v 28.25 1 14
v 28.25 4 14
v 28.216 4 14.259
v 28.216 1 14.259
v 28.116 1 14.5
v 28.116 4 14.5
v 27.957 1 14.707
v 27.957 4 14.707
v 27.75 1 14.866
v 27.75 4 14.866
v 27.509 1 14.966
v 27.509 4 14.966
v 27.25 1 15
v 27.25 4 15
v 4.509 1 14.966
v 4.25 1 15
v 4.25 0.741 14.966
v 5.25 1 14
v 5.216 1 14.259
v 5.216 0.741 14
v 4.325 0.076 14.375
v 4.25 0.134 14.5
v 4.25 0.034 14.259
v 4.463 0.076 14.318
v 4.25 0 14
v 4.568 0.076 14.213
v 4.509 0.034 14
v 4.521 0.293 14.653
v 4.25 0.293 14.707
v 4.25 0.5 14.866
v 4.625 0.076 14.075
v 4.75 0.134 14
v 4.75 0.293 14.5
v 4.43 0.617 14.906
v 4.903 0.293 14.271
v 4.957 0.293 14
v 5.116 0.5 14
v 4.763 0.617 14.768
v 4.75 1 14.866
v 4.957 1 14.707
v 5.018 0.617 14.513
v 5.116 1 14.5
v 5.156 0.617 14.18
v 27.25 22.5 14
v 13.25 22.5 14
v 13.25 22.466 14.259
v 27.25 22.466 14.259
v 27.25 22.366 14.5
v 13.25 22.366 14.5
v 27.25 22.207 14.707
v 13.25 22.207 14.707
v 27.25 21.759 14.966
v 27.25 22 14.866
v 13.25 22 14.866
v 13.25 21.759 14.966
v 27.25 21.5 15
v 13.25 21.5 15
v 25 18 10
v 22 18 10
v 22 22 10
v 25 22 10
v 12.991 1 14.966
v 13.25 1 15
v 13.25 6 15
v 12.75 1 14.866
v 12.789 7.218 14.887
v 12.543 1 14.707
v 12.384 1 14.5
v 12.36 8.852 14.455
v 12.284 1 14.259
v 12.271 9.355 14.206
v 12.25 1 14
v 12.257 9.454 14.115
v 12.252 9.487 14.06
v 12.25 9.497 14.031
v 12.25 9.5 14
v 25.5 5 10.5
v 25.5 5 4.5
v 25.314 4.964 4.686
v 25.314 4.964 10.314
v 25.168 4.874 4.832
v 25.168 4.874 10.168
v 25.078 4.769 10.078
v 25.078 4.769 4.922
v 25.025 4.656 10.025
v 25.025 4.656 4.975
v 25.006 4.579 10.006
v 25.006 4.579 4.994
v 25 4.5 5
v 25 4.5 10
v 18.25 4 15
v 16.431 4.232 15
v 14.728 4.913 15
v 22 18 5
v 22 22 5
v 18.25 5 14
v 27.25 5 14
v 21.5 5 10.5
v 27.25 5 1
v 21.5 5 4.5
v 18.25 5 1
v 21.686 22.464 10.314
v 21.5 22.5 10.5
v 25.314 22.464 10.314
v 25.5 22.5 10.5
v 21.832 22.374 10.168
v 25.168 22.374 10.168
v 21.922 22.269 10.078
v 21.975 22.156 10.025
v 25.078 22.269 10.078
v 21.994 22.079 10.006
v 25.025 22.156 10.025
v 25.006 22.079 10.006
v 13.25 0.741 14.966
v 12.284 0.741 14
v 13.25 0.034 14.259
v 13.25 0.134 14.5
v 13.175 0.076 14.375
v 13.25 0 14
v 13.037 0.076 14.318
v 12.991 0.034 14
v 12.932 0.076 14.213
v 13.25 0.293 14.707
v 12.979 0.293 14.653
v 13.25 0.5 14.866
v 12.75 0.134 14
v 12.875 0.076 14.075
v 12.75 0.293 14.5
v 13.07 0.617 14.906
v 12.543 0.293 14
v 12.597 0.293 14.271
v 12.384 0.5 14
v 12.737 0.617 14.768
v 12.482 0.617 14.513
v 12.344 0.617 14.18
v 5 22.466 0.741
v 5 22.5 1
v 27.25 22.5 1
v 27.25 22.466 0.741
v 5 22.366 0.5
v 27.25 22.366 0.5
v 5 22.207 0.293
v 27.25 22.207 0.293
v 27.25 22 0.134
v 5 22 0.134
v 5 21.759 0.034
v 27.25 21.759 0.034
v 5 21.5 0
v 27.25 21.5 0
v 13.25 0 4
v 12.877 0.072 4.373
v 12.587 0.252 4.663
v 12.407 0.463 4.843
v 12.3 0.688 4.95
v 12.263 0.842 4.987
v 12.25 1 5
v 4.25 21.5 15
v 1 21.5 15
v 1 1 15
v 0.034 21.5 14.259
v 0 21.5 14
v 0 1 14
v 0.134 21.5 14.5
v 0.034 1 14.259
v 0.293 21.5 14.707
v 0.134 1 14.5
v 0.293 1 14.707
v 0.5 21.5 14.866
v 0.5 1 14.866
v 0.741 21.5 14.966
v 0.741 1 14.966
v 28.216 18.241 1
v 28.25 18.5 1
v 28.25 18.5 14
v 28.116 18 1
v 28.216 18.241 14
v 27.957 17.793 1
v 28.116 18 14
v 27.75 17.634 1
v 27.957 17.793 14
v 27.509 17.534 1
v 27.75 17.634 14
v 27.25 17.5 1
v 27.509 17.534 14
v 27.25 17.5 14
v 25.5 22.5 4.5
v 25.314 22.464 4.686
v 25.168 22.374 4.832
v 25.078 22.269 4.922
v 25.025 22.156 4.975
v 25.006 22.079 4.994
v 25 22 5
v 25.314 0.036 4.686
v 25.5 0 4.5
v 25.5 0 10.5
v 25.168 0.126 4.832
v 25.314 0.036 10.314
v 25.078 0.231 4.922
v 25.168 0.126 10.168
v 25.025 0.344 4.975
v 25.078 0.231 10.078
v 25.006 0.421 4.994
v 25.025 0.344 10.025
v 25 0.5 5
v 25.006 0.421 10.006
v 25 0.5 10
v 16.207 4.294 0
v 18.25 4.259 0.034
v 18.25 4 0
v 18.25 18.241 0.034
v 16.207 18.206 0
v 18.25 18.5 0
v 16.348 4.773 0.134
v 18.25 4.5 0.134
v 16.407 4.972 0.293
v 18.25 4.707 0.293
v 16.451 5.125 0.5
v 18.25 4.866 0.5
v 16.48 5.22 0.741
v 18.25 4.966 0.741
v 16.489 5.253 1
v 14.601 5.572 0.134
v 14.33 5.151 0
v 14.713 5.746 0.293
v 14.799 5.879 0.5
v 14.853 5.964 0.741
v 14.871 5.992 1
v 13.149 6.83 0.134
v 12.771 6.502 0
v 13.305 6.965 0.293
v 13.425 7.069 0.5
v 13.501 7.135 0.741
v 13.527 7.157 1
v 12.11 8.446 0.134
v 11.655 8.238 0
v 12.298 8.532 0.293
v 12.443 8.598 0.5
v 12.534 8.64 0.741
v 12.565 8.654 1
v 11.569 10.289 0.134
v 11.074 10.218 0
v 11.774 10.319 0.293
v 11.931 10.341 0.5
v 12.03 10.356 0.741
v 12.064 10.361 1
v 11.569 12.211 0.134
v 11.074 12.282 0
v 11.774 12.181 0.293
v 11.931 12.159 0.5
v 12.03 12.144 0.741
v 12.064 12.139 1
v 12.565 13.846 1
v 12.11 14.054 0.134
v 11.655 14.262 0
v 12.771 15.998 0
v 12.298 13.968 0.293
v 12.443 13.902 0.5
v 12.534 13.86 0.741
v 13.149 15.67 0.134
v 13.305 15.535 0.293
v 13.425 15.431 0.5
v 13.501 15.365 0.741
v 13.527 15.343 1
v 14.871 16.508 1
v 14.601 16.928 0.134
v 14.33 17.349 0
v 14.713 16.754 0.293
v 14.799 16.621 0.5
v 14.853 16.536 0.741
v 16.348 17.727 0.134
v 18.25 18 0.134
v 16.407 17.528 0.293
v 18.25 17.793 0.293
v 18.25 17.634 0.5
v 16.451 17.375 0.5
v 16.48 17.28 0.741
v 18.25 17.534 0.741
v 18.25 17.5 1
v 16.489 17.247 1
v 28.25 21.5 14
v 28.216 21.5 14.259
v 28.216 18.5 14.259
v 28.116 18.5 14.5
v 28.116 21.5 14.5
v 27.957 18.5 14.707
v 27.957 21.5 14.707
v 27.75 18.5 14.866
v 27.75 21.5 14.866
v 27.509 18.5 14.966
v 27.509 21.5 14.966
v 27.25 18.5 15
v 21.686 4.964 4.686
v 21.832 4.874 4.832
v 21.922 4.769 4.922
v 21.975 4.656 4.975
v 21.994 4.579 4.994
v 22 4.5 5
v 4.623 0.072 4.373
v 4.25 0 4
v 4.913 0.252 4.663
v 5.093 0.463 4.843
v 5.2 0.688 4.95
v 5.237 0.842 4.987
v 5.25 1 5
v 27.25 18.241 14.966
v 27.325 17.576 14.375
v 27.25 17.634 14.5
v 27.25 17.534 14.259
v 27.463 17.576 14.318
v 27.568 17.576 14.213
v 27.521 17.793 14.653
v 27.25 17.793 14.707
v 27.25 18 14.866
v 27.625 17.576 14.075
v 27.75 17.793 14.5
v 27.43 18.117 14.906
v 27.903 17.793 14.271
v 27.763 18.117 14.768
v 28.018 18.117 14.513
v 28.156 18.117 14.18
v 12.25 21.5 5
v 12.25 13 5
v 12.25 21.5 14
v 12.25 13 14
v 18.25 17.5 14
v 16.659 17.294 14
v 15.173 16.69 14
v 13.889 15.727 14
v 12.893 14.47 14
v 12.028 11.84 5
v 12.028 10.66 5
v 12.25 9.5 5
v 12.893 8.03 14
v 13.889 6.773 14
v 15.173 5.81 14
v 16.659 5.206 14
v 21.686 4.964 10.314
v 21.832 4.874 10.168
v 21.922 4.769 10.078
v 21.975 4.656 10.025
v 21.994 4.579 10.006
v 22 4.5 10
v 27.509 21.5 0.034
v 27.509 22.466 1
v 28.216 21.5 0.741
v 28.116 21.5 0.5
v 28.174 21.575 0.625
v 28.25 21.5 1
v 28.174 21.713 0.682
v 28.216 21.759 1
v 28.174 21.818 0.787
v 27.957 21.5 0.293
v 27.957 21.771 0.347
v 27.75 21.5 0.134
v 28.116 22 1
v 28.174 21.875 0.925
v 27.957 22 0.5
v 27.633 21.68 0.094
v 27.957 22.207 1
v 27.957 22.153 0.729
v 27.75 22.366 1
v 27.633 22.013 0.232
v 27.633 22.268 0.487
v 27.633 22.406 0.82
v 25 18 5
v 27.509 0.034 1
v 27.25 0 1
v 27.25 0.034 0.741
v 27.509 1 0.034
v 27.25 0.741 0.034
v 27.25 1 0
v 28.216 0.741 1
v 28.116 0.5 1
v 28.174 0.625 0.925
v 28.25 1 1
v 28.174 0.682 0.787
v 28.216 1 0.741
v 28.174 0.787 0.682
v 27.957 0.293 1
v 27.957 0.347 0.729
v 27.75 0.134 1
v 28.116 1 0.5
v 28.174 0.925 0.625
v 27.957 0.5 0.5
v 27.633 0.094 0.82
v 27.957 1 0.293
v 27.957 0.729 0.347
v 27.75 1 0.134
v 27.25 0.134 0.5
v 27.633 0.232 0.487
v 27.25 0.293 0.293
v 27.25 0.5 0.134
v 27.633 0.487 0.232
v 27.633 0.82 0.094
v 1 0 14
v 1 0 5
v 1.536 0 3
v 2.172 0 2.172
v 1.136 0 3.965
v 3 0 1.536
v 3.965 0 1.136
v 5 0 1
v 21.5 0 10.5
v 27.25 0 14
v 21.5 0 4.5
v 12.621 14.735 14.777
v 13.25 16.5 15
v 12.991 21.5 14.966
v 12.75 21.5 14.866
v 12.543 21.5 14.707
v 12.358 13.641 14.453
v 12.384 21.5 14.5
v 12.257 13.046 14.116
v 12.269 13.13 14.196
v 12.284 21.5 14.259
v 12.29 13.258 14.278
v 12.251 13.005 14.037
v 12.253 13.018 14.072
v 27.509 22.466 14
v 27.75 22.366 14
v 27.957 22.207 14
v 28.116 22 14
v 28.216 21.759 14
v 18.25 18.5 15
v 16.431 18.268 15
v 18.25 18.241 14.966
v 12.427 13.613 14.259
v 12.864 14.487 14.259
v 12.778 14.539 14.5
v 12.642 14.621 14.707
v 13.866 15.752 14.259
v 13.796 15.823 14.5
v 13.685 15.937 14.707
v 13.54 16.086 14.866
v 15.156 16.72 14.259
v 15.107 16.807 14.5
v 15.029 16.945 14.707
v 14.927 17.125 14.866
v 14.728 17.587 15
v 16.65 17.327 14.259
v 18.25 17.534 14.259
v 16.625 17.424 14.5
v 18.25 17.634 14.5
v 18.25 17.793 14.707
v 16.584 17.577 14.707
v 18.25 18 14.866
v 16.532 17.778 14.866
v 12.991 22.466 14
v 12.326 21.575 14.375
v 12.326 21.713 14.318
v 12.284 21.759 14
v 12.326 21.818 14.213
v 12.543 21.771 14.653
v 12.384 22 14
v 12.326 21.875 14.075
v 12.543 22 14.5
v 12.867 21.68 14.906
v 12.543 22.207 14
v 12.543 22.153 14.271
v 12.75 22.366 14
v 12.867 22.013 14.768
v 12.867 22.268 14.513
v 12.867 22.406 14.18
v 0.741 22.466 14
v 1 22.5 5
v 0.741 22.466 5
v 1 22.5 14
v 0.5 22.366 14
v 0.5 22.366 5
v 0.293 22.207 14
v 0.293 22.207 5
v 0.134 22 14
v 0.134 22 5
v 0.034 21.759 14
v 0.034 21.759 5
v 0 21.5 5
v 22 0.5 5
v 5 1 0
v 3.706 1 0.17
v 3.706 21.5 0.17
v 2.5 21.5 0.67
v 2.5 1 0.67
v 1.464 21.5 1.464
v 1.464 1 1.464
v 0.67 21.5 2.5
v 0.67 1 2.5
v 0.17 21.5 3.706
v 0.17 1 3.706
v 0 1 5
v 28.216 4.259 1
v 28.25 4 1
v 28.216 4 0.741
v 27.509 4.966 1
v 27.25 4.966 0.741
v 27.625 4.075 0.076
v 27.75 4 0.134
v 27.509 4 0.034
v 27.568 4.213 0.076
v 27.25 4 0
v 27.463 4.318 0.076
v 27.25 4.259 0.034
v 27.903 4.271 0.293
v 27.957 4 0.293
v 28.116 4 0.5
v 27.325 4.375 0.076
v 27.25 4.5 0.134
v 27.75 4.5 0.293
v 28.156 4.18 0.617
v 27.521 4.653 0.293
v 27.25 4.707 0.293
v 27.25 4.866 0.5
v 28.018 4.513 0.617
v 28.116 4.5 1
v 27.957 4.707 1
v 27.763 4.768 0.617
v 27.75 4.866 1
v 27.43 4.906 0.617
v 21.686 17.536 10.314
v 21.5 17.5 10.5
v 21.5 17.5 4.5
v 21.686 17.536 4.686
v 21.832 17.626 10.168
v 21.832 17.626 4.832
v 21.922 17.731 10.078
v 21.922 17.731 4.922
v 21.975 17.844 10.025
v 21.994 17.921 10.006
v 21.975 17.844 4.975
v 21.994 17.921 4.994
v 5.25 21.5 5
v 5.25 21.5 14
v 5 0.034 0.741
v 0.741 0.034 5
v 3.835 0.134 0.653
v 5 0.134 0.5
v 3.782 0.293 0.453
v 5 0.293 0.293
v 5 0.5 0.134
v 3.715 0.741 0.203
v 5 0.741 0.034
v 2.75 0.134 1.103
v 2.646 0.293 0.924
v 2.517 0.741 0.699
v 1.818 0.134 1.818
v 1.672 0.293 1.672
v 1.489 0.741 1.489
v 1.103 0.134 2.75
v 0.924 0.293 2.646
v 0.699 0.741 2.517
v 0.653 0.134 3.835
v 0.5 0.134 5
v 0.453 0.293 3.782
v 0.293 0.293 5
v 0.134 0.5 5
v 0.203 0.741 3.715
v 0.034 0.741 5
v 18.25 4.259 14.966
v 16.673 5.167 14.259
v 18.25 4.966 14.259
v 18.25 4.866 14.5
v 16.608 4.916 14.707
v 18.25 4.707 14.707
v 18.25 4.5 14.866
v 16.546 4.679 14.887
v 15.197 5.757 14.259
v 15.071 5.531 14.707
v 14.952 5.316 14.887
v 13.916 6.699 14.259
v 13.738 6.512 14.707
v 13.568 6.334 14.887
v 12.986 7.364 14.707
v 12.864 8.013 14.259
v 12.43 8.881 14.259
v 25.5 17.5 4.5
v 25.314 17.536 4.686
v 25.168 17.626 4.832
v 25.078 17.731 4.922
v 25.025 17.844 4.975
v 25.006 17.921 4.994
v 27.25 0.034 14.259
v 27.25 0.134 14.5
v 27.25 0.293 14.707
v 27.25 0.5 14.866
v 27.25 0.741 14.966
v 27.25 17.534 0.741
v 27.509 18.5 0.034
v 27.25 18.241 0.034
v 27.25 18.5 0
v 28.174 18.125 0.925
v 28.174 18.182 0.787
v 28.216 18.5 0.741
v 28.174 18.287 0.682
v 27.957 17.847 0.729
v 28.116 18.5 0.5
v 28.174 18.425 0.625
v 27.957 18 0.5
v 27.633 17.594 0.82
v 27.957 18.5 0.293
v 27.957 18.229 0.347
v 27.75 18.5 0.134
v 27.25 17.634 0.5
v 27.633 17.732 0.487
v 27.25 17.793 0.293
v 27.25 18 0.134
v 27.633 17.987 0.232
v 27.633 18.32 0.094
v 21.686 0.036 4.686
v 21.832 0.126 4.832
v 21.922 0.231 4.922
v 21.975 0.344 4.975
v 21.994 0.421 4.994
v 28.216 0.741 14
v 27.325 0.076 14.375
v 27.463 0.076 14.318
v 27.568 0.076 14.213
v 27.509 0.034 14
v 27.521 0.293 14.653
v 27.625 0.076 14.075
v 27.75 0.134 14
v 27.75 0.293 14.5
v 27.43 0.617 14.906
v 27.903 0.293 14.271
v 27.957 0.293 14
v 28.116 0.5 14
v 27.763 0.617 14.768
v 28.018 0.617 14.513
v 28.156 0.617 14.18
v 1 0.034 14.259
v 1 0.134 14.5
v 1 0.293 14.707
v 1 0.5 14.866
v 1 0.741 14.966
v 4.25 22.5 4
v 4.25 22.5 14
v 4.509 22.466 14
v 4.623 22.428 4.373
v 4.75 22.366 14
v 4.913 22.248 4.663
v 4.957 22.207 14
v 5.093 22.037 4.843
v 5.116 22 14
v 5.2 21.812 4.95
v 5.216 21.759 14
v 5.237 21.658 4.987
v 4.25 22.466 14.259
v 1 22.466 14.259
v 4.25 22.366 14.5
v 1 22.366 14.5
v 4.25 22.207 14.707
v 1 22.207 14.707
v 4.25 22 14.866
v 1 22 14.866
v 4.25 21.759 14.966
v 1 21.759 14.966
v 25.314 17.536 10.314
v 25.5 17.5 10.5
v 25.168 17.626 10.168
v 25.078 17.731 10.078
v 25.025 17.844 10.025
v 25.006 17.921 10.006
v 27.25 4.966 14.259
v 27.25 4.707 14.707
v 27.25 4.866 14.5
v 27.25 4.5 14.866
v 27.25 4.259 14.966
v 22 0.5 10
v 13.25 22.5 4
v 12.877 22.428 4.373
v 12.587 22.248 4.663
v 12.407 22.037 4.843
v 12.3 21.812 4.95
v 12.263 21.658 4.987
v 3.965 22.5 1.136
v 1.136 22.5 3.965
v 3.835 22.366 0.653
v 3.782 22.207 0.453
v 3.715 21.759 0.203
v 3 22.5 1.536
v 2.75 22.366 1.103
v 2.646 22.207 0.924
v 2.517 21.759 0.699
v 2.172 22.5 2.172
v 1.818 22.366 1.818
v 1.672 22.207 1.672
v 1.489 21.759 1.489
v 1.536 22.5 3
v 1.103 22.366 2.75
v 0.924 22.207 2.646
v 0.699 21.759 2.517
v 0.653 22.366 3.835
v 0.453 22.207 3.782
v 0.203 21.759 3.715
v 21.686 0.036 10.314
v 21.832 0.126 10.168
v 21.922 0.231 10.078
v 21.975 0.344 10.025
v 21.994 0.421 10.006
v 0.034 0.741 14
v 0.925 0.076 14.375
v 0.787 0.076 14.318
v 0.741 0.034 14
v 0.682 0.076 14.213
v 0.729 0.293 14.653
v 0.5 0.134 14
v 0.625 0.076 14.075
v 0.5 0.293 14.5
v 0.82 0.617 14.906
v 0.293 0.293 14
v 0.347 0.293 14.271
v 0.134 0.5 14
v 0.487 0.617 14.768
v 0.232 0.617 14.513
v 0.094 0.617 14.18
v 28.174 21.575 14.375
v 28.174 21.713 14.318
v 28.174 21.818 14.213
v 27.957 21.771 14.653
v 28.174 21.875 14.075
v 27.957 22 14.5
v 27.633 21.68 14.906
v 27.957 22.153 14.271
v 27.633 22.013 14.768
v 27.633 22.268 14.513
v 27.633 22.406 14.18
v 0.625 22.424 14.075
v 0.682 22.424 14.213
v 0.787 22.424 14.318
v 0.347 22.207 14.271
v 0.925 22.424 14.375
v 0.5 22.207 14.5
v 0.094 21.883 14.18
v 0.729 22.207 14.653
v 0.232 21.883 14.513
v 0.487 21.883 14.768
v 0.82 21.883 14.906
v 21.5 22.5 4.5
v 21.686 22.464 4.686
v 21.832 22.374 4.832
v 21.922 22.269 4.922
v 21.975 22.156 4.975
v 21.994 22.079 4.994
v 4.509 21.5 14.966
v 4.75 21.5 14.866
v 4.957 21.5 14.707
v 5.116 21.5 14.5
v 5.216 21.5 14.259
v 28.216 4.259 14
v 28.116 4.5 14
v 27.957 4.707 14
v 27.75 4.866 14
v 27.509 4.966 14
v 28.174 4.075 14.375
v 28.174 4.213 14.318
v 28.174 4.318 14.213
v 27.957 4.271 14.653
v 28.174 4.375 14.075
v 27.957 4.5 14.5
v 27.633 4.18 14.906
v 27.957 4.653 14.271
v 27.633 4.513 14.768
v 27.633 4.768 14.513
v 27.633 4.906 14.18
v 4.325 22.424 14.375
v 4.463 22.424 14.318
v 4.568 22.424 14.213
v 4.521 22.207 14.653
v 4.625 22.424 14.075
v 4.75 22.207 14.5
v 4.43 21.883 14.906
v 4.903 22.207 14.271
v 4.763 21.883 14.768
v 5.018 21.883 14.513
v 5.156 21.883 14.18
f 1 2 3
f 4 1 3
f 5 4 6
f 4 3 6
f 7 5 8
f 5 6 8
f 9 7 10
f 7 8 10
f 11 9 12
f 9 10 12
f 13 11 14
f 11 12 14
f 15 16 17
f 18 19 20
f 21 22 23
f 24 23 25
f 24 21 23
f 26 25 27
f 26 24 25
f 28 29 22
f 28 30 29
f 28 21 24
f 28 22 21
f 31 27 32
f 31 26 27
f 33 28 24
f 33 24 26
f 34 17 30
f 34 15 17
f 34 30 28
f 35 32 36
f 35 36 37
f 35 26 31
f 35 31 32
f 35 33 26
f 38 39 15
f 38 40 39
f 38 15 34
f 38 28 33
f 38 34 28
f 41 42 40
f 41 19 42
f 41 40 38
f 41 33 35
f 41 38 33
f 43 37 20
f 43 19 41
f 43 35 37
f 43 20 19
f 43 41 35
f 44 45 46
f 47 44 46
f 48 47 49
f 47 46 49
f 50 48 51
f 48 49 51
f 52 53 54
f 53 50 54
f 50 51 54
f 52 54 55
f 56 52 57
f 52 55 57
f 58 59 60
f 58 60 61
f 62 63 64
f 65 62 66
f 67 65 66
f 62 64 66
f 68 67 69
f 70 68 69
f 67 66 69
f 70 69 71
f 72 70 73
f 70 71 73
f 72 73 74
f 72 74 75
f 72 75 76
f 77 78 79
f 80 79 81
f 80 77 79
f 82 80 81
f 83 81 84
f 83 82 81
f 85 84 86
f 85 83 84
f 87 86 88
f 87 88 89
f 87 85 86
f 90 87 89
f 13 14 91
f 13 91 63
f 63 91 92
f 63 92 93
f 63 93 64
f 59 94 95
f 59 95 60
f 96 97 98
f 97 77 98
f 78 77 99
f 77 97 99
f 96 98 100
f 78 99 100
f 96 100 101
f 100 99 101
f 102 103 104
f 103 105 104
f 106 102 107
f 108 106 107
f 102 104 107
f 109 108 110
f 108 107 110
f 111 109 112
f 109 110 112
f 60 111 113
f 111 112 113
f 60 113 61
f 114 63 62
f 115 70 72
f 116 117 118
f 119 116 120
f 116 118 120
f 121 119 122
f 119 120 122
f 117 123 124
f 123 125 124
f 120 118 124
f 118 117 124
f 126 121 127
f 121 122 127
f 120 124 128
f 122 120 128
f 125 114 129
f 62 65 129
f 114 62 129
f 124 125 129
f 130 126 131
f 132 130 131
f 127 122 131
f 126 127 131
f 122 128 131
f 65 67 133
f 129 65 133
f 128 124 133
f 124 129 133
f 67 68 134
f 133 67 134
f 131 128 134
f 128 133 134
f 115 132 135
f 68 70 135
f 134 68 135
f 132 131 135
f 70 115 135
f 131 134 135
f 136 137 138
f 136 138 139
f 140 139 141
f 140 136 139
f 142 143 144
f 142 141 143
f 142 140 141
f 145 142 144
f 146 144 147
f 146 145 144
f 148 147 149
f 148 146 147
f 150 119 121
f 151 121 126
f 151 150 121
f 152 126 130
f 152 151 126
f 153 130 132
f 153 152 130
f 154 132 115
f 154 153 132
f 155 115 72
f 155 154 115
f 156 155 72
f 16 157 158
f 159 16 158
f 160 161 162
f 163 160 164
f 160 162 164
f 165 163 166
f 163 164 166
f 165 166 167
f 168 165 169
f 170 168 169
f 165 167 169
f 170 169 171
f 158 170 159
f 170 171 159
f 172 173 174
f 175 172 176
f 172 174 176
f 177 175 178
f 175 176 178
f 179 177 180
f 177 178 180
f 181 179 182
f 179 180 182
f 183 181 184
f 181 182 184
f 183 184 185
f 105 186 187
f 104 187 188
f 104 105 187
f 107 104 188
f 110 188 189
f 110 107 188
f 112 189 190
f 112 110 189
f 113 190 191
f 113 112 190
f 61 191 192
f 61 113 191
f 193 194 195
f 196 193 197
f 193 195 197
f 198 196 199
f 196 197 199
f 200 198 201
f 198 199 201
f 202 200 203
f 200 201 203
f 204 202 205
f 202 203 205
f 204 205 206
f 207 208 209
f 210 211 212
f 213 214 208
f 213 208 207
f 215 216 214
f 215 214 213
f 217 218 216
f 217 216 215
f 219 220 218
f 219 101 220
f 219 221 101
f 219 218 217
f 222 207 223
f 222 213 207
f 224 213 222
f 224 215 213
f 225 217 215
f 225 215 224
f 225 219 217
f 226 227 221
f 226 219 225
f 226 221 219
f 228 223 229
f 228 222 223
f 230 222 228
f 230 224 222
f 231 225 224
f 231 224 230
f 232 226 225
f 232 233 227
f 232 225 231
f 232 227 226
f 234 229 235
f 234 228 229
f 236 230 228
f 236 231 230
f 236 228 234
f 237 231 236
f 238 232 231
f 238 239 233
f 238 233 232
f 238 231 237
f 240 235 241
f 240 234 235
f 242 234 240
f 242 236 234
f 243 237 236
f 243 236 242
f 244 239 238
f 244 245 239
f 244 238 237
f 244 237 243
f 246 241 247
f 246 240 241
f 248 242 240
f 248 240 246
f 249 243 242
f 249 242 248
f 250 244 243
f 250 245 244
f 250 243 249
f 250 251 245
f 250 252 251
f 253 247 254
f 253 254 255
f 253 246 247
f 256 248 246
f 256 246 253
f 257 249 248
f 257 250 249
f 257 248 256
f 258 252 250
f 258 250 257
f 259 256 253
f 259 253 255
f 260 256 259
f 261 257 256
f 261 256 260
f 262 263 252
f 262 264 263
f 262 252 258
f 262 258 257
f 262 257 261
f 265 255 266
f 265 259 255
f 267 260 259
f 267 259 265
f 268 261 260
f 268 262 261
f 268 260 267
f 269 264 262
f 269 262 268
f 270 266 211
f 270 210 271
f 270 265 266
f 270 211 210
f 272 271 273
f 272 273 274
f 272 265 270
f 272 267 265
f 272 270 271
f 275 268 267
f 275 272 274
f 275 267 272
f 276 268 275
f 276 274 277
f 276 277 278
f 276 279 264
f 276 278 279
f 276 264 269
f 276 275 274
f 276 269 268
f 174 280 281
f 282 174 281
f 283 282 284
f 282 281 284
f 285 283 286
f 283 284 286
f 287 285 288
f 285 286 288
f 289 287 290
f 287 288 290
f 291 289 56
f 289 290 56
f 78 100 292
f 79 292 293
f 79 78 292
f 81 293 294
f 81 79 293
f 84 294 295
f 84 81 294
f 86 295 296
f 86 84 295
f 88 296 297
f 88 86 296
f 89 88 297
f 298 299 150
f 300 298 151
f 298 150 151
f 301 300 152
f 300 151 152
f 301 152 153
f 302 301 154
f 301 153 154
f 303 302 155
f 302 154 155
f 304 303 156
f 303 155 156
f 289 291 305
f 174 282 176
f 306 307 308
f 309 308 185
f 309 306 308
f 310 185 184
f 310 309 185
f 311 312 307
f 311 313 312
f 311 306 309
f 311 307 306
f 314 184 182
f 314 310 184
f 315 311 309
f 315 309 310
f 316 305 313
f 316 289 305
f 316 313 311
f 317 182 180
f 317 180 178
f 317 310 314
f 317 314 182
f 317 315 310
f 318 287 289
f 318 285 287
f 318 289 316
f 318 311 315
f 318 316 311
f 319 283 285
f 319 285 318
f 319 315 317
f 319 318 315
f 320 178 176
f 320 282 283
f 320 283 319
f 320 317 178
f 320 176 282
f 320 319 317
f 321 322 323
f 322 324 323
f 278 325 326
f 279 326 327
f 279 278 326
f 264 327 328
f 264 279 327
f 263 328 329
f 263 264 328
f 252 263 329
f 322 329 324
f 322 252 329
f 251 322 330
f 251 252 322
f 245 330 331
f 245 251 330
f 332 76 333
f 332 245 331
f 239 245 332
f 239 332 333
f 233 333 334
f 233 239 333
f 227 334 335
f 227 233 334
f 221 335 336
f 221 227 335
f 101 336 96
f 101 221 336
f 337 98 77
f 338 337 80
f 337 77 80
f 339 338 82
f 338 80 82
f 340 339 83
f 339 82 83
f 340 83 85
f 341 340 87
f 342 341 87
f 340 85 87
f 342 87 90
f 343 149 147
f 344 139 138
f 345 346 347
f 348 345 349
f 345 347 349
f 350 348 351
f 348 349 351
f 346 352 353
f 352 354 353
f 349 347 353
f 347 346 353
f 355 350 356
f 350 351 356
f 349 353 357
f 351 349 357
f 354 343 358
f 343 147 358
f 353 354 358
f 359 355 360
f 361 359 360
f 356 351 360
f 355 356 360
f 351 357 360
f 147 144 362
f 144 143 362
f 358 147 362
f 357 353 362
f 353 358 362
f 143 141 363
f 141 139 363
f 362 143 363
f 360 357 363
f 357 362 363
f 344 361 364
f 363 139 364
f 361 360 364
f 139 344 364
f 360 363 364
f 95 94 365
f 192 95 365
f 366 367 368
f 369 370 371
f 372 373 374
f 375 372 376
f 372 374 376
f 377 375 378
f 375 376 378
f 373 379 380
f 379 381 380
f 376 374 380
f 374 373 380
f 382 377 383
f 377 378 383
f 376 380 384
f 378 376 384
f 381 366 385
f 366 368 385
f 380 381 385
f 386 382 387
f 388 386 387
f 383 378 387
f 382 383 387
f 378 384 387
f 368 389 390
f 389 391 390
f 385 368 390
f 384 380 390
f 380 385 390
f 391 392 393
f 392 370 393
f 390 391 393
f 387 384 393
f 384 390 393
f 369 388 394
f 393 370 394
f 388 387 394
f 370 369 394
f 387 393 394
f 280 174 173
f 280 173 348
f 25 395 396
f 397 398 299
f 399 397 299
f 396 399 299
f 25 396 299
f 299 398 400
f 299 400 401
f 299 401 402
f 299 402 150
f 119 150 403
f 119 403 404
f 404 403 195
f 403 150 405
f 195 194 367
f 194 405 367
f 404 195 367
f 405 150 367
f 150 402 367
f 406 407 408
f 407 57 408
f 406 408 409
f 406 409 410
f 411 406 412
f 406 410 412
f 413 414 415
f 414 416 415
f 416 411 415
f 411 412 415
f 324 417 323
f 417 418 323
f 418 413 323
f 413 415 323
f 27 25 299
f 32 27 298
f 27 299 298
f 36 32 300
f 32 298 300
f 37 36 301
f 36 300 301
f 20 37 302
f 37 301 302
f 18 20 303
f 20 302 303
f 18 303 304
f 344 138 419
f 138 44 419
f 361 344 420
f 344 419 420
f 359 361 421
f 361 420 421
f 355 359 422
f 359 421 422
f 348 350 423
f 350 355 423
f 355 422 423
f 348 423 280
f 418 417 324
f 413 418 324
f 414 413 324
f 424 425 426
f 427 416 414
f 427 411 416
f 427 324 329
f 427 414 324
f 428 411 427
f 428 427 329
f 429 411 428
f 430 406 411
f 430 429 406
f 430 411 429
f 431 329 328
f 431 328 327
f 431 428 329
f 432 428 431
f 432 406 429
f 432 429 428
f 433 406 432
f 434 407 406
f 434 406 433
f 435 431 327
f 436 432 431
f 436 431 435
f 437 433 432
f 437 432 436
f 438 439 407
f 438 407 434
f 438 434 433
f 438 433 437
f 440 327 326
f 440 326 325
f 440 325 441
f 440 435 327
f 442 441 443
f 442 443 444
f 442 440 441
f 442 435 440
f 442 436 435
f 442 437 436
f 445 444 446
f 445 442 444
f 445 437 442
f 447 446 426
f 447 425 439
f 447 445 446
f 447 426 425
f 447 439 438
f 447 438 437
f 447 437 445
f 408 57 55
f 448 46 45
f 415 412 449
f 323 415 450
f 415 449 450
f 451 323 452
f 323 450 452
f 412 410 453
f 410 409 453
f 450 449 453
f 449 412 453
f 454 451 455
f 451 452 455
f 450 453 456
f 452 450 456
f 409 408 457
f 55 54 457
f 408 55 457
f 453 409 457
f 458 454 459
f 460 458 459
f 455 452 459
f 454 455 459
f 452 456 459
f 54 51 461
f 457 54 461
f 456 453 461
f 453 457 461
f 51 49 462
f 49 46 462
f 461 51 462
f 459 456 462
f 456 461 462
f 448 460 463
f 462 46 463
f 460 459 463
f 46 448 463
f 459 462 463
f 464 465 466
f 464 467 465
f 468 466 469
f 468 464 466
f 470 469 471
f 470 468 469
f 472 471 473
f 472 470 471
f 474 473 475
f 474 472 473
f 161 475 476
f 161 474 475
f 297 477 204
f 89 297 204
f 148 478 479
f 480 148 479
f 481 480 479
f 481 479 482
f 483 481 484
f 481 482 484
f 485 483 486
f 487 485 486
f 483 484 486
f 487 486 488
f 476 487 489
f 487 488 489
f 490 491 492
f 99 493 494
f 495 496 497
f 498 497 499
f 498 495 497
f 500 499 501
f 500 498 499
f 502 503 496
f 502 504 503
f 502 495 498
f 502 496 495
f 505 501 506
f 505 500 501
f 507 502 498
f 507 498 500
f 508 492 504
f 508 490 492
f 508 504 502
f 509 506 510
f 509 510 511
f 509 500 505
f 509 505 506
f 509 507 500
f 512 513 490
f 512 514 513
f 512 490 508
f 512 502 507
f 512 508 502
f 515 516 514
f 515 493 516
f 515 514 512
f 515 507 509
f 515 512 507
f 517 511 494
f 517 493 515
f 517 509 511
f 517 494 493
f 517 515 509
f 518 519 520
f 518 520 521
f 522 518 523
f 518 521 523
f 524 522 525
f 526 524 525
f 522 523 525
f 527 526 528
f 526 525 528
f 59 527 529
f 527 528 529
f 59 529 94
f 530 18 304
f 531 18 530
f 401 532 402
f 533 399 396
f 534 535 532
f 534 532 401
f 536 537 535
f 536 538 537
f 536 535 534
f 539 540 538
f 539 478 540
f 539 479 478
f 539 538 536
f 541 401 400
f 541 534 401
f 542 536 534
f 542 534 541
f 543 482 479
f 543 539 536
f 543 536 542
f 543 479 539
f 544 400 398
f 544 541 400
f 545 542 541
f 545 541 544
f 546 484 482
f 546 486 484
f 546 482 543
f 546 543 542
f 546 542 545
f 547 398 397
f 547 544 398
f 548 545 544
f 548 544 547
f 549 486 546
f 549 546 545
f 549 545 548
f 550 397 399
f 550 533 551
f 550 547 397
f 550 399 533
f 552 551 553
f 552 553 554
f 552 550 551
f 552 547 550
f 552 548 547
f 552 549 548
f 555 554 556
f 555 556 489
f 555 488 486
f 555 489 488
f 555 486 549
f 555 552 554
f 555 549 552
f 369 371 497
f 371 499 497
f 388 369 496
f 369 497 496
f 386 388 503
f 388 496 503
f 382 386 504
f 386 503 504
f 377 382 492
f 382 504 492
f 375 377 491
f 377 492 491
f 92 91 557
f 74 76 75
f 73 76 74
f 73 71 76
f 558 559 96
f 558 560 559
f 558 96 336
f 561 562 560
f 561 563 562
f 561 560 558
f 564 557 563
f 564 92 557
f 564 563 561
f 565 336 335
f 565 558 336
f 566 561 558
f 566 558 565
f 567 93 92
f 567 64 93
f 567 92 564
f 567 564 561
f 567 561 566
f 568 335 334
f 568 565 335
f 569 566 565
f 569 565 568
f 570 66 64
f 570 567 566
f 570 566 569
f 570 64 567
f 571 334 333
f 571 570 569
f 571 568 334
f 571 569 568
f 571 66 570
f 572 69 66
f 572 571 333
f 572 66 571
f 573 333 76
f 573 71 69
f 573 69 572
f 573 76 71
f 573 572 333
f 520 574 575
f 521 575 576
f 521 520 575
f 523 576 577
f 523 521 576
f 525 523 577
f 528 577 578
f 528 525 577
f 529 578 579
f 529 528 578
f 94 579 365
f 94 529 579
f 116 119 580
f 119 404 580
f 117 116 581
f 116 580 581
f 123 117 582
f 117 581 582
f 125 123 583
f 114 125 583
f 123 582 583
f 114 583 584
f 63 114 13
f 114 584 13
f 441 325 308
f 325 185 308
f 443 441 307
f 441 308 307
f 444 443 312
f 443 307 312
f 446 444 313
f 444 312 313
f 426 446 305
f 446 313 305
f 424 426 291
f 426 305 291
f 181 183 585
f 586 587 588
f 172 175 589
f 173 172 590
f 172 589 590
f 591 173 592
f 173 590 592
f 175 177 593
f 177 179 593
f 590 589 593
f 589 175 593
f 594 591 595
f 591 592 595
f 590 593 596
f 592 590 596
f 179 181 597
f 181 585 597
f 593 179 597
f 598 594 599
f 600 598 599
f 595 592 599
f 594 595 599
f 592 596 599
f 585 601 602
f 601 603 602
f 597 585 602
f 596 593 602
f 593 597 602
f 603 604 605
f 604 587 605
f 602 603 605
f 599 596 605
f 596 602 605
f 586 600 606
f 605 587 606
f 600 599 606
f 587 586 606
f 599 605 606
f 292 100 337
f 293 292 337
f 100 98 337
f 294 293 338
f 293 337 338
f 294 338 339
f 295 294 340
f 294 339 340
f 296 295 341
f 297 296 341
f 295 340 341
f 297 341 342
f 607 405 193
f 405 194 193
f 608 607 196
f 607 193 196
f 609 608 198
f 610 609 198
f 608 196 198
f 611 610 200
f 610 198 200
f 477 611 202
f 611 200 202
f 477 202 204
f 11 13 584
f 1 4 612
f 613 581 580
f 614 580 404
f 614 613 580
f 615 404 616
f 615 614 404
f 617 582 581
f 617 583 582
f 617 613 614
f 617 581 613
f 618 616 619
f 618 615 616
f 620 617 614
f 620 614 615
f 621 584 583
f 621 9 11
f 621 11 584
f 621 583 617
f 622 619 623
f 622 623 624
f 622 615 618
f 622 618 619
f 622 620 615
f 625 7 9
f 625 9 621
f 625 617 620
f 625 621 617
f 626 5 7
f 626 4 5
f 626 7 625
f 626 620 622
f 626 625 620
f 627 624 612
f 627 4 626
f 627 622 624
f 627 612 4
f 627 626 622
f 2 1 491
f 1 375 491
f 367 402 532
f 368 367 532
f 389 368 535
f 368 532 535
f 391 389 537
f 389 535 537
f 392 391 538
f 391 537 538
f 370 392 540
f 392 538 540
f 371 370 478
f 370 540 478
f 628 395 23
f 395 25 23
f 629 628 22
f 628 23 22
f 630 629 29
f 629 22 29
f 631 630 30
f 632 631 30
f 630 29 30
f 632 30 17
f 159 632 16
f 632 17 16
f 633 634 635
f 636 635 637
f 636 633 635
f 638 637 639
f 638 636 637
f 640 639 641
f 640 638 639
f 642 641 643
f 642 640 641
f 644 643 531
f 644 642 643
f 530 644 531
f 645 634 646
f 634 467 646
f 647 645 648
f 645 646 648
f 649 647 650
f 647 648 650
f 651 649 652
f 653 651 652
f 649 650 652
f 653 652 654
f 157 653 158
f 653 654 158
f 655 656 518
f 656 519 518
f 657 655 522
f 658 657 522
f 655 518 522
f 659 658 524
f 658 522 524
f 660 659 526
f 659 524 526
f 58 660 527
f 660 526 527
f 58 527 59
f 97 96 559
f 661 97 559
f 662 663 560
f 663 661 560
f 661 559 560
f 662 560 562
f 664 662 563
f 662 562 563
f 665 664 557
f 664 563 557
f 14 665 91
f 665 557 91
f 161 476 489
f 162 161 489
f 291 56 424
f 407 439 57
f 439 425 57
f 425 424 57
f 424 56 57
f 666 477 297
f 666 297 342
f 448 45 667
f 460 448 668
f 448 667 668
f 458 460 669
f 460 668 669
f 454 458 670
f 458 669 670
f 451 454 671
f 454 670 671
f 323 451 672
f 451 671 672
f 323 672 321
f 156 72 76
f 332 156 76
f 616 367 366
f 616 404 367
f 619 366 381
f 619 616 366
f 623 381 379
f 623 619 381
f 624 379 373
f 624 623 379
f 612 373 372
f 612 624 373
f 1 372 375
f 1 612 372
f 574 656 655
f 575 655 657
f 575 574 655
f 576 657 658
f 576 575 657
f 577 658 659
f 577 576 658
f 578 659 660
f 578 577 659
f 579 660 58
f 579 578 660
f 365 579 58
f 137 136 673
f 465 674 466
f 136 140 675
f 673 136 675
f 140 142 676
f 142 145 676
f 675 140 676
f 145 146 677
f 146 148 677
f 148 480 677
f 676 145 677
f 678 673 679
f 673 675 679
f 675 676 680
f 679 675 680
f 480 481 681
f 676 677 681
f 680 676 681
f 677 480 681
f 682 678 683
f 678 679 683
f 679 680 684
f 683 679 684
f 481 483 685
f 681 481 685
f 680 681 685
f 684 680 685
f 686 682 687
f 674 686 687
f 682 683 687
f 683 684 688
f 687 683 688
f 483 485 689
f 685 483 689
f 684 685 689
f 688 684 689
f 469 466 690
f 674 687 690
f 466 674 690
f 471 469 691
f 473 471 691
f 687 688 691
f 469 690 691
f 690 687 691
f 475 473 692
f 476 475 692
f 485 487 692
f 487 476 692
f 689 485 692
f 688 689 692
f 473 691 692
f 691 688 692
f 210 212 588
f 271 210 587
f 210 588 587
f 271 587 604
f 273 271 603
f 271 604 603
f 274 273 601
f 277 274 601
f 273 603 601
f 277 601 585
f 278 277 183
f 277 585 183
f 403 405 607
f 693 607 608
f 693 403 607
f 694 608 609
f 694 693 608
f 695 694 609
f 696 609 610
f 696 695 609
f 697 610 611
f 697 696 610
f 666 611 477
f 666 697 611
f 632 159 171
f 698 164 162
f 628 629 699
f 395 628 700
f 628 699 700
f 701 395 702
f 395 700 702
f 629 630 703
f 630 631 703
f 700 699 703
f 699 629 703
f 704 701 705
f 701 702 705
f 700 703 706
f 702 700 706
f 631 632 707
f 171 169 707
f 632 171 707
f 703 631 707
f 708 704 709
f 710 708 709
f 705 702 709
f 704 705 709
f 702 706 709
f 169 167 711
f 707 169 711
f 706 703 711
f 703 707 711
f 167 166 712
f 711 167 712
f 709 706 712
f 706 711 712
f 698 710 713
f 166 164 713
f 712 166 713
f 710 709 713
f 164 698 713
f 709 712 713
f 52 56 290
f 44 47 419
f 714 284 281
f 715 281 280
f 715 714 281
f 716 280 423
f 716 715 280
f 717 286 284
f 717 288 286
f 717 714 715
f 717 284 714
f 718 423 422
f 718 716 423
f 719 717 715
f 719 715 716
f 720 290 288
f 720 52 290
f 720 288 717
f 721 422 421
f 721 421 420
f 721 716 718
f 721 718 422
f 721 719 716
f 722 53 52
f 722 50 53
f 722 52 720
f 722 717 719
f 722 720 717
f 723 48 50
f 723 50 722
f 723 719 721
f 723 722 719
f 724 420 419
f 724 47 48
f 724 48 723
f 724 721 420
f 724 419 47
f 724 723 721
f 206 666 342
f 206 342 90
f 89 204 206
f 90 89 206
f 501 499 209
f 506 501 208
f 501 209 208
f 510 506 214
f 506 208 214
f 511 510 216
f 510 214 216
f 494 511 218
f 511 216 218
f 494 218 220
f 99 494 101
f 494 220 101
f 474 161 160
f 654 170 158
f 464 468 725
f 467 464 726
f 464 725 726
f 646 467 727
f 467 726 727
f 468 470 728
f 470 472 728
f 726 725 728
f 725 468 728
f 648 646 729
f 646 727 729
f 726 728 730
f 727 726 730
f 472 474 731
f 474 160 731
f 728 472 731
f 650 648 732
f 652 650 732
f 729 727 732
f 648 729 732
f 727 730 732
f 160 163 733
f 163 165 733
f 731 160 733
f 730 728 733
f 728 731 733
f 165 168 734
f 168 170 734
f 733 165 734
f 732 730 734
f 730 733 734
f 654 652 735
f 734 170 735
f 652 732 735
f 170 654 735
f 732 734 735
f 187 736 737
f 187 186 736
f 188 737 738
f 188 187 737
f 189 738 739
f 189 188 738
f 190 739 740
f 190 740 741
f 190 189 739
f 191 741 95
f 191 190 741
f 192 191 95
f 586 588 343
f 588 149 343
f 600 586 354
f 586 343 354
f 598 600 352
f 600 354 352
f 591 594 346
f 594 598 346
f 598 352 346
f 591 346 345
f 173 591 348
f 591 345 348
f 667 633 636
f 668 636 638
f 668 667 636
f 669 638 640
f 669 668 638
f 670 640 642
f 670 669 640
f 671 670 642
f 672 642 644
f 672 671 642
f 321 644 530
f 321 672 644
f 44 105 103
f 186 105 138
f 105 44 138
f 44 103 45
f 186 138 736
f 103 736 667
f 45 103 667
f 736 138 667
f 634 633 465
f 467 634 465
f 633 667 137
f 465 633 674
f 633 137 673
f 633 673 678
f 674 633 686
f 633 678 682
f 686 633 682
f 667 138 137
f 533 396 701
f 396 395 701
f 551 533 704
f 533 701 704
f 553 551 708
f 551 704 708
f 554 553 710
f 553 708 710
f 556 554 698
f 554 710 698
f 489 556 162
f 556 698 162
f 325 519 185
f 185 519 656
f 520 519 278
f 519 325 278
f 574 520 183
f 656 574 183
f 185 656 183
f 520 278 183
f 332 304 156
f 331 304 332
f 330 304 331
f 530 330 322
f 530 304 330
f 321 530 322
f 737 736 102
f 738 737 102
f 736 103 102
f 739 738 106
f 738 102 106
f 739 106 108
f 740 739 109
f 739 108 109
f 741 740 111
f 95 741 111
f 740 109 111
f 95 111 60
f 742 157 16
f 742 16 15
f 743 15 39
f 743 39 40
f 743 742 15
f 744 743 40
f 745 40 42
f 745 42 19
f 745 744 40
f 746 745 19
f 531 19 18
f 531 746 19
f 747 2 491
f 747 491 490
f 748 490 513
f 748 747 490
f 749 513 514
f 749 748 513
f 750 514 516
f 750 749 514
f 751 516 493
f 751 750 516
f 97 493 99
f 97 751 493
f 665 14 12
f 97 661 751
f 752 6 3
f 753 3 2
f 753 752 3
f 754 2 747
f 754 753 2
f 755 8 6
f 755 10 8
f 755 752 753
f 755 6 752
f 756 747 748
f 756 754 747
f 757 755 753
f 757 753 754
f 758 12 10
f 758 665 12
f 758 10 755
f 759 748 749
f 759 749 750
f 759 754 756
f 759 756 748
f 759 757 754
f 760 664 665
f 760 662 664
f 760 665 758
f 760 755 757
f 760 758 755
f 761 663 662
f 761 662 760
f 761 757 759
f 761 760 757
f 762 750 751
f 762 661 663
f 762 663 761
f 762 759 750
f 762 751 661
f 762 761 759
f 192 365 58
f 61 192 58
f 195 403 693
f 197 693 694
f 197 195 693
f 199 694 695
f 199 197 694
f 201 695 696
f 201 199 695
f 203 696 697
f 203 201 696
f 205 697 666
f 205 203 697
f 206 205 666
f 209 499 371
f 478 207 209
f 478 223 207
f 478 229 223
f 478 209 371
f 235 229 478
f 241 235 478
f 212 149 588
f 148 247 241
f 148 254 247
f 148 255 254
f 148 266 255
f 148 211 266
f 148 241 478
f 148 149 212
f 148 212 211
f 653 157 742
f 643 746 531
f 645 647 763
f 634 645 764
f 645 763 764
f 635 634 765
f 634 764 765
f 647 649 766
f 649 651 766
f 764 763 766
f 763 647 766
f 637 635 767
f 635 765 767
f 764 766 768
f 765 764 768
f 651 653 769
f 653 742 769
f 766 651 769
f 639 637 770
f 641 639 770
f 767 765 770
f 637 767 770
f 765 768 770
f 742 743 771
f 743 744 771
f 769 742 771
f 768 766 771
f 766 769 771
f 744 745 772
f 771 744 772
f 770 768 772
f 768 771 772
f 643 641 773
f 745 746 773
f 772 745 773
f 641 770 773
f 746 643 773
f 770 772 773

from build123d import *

# Parameters (mm, degrees)
PAD_DEPTH       = 15
SKETCH001_W     = 7
SKETCH001_H     = 22.5
POCKET_DEPTH    = 10
SKETCH003_W     = 3
SKETCH003_H     = 5
POCKET001_DEPTH = 22.501
FILLET_R        = 5
FILLET001_R     = 1
FILLET002_R     = 0.5


with BuildPart() as part:
    # Sketch → Pad (new body)
    with BuildSketch(Plane.XY):
        with BuildLine():
            ThreePointArc((18.25, 17.5), (12, 11.25), (18.25, 5))
            Line((28.25, 5), (18.25, 5))
            Line((28.25, 0), (28.25, 5))
            Line((0, 0), (28.25, 0))
            Line((0, 22.5), (0, 0))
            Line((28.25, 22.5), (0, 22.5))
            Line((28.25, 17.5), (28.25, 22.5))
            Line((18.25, 17.5), (28.25, 17.5))
        make_face()
    extrude(amount=PAD_DEPTH)

    # Sketch001 (on Face10 of Pad) → Pocket (cut)
    with BuildSketch(Plane.XY.offset(15)):
        with Locations((8.75, 11.25)):
            Rectangle(SKETCH001_W, SKETCH001_H)
    extrude(amount=-POCKET_DEPTH, mode=Mode.SUBTRACT)

    # Sketch003 → Pocket001 (cut, through all)
    with BuildSketch(Plane.XZ):
        with Locations((23.5, 7.5)):
            Rectangle(SKETCH003_W, SKETCH003_H)
    extrude(amount=-POCKET001_DEPTH, mode=Mode.SUBTRACT)

    # Fillet
    fillet_edges = [part.edges().sort_by_distance(p)[0] for p in [
        (0, 11.25, 0),
    ]]
    fillet(fillet_edges, radius=FILLET_R)

    # Fillet001
    fillet001_edges = [part.edges().sort_by_distance(p)[0] for p in [
        (0, 11.25, 15),
        (5.25, 11.25, 15),
        (2.625, 0, 15),
        (0, 0, 10),
        (0, 22.5, 10),
        (2.625, 22.5, 15),
        (20.25, 22.5, 15),
        (28.25, 20, 15),
        (23.25, 17.5, 15),
        (14.5, 16.25, 15),
        (12.25, 17.75, 15),
        (12.25, 4.75, 15),
        (23.25, 5, 15),
        (14.5, 6.25, 15),
        (28.25, 2.5, 15),
        (20.25, 0, 15),
        (28.25, 0, 7.5),
        (16.625, 0, 0),
        (1.464466, 0, 1.464466),
        (5.25, 0, 10),
        (8.75, 0, 5),
        (12.25, 0, 10),
        (12.25, 22.5, 10),
        (5.25, 22.5, 10),
        (8.75, 22.5, 5),
        (16.625, 22.5, 0),
        (1.464466, 22.5, 1.464466),
        (28.25, 5, 7.5),
        (28.25, 2.5, 0),
        (23.25, 5, 0),
        (12, 11.25, 0),
        (28.25, 17.5, 7.5),
        (28.25, 20, 0),
        (28.25, 22.5, 7.5),
        (23.25, 17.5, 0),
    ]]
    fillet(fillet001_edges, radius=FILLET001_R)

    # Fillet002
    fillet002_edges = [part.edges().sort_by_distance(p)[0] for p in [
        (25, 0, 7.5),
        (23.5, 0, 5),
        (22, 0, 7.5),
        (23.5, 0, 10),
        (23.5, 17.5, 10),
        (25, 17.5, 7.5),
        (23.5, 17.5, 5),
        (22, 17.5, 7.5),
        (25, 5, 7.5),
        (23.5, 5, 10),
        (22, 5, 7.5),
        (23.5, 5, 5),
        (23.5, 22.5, 10),
        (22, 22.5, 7.5),
        (23.5, 22.5, 5),
        (25, 22.5, 7.5),
    ]]
    fillet(fillet002_edges, radius=FILLET002_R)


solid = part.part
